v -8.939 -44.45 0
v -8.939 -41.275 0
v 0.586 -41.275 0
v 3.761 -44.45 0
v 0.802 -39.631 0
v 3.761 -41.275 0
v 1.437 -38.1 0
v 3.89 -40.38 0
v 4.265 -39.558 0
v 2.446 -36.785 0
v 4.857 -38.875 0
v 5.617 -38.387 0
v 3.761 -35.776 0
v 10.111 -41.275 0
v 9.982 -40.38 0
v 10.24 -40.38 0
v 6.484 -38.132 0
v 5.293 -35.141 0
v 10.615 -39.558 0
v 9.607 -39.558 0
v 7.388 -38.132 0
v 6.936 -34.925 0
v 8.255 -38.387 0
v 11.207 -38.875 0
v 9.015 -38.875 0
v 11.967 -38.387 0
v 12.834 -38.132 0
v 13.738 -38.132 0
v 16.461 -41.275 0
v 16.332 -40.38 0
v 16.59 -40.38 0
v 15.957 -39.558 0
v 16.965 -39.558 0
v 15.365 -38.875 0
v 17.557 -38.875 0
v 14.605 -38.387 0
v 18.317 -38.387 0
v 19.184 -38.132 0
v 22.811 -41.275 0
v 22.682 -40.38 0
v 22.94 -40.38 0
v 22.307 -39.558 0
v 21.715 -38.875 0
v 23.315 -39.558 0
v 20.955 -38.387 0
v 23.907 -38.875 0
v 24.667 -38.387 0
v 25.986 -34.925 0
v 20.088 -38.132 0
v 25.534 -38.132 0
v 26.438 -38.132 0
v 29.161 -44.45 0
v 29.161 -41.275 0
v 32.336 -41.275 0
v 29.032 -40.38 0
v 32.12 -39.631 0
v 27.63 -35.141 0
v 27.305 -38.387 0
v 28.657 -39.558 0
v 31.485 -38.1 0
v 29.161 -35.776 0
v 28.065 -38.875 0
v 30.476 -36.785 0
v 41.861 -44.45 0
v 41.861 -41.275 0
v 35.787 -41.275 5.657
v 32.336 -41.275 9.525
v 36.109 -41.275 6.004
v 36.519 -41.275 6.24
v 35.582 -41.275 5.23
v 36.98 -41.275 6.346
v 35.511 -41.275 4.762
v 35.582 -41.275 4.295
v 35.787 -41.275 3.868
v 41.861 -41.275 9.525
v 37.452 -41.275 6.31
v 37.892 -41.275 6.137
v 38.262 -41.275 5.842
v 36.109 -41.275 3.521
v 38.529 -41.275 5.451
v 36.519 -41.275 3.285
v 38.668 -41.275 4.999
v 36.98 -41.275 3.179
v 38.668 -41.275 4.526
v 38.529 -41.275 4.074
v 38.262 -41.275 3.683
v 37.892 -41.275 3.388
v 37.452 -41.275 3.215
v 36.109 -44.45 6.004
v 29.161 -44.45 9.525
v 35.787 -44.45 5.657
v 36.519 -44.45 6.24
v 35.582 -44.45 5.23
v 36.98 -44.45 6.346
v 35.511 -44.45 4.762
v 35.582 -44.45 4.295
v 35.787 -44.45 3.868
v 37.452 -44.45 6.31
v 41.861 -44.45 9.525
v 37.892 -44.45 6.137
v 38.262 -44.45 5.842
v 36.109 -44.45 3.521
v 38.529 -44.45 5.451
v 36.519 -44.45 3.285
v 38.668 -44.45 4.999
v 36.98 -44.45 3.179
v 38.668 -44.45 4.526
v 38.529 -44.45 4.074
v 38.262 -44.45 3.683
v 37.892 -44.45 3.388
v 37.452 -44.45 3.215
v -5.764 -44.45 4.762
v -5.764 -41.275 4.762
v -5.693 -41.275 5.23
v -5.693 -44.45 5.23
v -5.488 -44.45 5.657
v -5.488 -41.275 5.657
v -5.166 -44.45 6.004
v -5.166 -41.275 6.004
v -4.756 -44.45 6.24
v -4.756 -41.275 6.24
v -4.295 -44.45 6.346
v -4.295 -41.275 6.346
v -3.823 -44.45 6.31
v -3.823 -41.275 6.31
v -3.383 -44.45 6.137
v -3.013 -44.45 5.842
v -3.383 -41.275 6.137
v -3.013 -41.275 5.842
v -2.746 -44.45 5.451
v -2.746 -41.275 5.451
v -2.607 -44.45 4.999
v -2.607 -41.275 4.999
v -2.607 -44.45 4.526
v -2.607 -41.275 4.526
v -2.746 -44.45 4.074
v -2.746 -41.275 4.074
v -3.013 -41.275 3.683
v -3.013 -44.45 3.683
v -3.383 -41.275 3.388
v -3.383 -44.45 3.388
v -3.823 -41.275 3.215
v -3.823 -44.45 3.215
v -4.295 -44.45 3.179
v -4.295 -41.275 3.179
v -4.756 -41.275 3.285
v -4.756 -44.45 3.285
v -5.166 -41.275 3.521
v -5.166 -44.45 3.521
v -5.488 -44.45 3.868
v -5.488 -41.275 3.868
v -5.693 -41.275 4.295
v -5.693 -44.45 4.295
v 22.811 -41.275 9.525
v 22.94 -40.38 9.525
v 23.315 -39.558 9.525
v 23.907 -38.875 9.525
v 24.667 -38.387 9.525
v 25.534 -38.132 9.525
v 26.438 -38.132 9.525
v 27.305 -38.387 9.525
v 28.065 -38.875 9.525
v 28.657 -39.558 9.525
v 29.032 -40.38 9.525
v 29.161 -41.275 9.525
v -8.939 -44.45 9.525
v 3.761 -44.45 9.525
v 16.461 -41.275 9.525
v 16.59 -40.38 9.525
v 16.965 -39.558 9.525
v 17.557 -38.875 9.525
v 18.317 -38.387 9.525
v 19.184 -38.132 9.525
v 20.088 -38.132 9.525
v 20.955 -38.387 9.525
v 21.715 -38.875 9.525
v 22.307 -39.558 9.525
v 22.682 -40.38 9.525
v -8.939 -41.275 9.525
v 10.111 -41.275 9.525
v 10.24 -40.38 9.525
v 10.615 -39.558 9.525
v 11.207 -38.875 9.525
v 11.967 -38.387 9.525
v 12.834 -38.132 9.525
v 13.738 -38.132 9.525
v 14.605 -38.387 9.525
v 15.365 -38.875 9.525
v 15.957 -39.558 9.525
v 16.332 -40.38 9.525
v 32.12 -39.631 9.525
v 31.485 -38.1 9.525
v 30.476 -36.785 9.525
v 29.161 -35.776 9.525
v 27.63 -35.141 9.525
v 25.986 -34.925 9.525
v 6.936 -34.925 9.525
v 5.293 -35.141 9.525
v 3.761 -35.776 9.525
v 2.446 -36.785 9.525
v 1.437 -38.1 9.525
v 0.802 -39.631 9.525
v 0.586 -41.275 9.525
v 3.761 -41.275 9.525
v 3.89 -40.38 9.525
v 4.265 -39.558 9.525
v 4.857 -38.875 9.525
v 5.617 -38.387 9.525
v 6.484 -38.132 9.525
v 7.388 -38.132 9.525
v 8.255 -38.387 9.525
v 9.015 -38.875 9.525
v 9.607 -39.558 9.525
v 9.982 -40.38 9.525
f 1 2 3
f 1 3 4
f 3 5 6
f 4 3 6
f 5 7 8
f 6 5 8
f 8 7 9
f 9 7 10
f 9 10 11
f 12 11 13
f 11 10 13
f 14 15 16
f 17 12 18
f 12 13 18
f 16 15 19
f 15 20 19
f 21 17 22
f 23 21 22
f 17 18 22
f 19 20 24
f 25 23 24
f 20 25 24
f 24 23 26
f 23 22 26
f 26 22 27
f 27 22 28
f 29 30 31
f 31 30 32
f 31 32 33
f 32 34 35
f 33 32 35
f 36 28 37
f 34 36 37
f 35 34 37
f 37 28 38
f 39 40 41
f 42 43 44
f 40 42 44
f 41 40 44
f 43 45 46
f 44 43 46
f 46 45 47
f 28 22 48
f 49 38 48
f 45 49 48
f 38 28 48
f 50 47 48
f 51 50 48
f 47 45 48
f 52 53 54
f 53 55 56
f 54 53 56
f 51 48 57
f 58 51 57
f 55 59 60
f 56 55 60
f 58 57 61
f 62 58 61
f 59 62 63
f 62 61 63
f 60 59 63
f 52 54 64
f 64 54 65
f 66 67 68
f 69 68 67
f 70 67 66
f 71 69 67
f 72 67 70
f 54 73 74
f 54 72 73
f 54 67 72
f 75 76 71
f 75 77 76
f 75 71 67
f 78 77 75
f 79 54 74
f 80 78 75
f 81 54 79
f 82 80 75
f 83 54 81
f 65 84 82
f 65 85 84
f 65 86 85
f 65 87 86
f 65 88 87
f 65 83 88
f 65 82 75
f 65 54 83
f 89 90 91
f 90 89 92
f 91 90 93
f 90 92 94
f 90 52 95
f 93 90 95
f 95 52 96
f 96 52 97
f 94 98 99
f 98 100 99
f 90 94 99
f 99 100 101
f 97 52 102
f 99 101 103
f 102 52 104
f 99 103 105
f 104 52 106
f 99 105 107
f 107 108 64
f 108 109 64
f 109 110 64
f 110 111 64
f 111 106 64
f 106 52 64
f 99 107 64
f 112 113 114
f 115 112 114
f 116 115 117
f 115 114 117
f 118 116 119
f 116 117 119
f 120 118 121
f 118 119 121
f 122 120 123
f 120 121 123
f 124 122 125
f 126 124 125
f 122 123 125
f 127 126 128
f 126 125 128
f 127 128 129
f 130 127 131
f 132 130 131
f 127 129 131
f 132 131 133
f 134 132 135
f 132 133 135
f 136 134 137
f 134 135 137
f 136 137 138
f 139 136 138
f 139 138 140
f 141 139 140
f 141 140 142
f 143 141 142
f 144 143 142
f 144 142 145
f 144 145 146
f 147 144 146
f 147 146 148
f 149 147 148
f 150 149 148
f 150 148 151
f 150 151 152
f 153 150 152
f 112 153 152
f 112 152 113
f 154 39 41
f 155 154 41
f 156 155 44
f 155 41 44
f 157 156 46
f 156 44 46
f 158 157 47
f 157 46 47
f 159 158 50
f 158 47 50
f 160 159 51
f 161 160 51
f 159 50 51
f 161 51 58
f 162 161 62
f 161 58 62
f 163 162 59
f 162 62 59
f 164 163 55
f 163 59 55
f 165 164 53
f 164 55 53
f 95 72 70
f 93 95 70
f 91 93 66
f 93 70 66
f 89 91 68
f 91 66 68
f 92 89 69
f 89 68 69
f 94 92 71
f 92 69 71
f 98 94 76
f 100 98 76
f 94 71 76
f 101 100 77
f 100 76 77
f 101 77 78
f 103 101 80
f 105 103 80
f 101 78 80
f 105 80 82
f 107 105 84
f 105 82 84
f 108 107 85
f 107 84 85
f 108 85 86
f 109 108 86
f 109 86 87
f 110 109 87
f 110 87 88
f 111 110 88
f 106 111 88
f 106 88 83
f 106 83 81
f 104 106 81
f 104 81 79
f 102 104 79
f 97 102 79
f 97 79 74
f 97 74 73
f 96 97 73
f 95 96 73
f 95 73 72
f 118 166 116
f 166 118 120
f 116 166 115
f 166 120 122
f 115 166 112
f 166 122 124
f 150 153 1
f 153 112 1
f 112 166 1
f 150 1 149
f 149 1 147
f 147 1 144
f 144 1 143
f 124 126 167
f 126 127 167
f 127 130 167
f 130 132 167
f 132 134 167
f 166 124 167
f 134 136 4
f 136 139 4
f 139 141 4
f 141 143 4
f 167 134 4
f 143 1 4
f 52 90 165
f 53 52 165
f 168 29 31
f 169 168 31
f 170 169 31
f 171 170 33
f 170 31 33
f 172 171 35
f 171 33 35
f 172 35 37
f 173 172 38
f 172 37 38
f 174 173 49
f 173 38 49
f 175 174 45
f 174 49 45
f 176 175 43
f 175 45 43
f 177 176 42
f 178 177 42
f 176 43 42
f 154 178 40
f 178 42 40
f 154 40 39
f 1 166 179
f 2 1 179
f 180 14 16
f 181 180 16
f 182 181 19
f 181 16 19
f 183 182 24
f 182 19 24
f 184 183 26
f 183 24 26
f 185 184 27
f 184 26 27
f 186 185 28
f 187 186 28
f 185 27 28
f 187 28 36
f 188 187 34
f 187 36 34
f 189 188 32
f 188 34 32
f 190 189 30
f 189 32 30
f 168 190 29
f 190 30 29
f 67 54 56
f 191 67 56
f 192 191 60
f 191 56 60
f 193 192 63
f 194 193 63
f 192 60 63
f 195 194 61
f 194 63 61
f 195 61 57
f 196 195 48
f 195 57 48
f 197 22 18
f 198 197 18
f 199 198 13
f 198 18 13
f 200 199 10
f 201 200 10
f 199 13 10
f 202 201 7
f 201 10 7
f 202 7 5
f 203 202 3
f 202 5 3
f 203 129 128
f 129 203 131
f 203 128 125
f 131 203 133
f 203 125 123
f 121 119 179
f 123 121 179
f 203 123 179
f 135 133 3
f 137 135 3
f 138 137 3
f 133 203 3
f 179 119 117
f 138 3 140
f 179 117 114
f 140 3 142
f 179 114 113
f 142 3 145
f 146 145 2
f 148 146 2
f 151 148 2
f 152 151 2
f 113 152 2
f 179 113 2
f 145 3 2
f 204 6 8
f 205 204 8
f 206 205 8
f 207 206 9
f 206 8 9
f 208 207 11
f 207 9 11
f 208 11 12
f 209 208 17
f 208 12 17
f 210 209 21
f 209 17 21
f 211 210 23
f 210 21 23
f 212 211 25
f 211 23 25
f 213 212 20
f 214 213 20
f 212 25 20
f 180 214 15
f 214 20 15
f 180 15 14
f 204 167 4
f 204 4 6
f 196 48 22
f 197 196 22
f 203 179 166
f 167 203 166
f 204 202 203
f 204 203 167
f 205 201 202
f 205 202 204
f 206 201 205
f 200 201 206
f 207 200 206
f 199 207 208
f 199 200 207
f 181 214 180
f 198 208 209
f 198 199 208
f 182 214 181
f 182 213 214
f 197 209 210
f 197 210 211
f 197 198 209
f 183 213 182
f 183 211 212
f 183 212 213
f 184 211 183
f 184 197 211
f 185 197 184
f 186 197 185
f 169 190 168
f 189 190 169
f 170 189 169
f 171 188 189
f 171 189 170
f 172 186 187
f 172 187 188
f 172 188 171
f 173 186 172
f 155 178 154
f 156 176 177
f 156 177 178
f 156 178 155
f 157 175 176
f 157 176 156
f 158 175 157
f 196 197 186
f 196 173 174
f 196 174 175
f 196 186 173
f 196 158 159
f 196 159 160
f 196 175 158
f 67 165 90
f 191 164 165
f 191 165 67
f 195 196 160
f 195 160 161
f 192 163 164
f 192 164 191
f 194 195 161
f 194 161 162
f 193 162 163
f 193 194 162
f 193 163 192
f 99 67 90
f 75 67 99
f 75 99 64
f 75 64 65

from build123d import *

# Parameters (mm, degrees)
F0_W     = 9.525
F0_H     = 3.175
F0_W_2   = 3.175
F1_DEPTH = 9.525
F2_R     = 1.5875
F3_R     = 1.5875
F4_DEPTH = 25.4


with BuildPart() as f1:
    # F0 (on Top) → F1 (new body)
    with BuildSketch(Plane.XY):
        with Locations((-4.176419, -42.8625)):
            Rectangle(F0_W, F0_H)
        with Locations((2.173581, -42.8625)):
            Rectangle(F0_W_2, F0_H)
        with BuildLine():
            Line((29.161081, -41.275), (32.336081, -41.275))
            ThreePointArc((32.336081, -41.275), (30.476209, -36.784872), (25.986081, -34.925))
            Line((25.986081, -34.925), (6.936081, -34.925))
            ThreePointArc((6.936081, -34.925), (2.445953, -36.784872), (0.586081, -41.275))
            Line((0.586081, -41.275), (3.761081, -41.275))
            ThreePointArc((3.761081, -41.275), (6.936081, -38.1), (10.111081, -41.275))
            ThreePointArc((10.111081, -41.275), (13.286081, -38.1), (16.461081, -41.275))
            ThreePointArc((16.461081, -41.275), (19.636081, -38.1), (22.811081, -41.275))
            ThreePointArc((22.811081, -41.275), (25.986081, -38.1), (29.161081, -41.275))
        make_face()
        with Locations((30.748581, -42.8625)):
            Rectangle(F0_W_2, F0_H)
        with Locations((37.098581, -42.8625)):
            Rectangle(F0_W, F0_H)
    extrude(amount=F1_DEPTH)

    # F2 (on face) + F3 (on face) → F4 (cut)
    with BuildSketch(Plane(origin=(0, -41.275, 0), x_dir=(-1, 0, 0), z_dir=(0, 1, 0))):
        with Locations((4.176419, 4.7625)):
            Circle(F2_R)
    with BuildSketch(Plane(origin=(0, -41.275, 0), x_dir=(-1, 0, 0), z_dir=(0, 1, 0))):
        with Locations((-37.098581, 4.7625)):
            Circle(F3_R)
    extrude(amount=-F4_DEPTH, mode=Mode.SUBTRACT)


solid = f1.part
